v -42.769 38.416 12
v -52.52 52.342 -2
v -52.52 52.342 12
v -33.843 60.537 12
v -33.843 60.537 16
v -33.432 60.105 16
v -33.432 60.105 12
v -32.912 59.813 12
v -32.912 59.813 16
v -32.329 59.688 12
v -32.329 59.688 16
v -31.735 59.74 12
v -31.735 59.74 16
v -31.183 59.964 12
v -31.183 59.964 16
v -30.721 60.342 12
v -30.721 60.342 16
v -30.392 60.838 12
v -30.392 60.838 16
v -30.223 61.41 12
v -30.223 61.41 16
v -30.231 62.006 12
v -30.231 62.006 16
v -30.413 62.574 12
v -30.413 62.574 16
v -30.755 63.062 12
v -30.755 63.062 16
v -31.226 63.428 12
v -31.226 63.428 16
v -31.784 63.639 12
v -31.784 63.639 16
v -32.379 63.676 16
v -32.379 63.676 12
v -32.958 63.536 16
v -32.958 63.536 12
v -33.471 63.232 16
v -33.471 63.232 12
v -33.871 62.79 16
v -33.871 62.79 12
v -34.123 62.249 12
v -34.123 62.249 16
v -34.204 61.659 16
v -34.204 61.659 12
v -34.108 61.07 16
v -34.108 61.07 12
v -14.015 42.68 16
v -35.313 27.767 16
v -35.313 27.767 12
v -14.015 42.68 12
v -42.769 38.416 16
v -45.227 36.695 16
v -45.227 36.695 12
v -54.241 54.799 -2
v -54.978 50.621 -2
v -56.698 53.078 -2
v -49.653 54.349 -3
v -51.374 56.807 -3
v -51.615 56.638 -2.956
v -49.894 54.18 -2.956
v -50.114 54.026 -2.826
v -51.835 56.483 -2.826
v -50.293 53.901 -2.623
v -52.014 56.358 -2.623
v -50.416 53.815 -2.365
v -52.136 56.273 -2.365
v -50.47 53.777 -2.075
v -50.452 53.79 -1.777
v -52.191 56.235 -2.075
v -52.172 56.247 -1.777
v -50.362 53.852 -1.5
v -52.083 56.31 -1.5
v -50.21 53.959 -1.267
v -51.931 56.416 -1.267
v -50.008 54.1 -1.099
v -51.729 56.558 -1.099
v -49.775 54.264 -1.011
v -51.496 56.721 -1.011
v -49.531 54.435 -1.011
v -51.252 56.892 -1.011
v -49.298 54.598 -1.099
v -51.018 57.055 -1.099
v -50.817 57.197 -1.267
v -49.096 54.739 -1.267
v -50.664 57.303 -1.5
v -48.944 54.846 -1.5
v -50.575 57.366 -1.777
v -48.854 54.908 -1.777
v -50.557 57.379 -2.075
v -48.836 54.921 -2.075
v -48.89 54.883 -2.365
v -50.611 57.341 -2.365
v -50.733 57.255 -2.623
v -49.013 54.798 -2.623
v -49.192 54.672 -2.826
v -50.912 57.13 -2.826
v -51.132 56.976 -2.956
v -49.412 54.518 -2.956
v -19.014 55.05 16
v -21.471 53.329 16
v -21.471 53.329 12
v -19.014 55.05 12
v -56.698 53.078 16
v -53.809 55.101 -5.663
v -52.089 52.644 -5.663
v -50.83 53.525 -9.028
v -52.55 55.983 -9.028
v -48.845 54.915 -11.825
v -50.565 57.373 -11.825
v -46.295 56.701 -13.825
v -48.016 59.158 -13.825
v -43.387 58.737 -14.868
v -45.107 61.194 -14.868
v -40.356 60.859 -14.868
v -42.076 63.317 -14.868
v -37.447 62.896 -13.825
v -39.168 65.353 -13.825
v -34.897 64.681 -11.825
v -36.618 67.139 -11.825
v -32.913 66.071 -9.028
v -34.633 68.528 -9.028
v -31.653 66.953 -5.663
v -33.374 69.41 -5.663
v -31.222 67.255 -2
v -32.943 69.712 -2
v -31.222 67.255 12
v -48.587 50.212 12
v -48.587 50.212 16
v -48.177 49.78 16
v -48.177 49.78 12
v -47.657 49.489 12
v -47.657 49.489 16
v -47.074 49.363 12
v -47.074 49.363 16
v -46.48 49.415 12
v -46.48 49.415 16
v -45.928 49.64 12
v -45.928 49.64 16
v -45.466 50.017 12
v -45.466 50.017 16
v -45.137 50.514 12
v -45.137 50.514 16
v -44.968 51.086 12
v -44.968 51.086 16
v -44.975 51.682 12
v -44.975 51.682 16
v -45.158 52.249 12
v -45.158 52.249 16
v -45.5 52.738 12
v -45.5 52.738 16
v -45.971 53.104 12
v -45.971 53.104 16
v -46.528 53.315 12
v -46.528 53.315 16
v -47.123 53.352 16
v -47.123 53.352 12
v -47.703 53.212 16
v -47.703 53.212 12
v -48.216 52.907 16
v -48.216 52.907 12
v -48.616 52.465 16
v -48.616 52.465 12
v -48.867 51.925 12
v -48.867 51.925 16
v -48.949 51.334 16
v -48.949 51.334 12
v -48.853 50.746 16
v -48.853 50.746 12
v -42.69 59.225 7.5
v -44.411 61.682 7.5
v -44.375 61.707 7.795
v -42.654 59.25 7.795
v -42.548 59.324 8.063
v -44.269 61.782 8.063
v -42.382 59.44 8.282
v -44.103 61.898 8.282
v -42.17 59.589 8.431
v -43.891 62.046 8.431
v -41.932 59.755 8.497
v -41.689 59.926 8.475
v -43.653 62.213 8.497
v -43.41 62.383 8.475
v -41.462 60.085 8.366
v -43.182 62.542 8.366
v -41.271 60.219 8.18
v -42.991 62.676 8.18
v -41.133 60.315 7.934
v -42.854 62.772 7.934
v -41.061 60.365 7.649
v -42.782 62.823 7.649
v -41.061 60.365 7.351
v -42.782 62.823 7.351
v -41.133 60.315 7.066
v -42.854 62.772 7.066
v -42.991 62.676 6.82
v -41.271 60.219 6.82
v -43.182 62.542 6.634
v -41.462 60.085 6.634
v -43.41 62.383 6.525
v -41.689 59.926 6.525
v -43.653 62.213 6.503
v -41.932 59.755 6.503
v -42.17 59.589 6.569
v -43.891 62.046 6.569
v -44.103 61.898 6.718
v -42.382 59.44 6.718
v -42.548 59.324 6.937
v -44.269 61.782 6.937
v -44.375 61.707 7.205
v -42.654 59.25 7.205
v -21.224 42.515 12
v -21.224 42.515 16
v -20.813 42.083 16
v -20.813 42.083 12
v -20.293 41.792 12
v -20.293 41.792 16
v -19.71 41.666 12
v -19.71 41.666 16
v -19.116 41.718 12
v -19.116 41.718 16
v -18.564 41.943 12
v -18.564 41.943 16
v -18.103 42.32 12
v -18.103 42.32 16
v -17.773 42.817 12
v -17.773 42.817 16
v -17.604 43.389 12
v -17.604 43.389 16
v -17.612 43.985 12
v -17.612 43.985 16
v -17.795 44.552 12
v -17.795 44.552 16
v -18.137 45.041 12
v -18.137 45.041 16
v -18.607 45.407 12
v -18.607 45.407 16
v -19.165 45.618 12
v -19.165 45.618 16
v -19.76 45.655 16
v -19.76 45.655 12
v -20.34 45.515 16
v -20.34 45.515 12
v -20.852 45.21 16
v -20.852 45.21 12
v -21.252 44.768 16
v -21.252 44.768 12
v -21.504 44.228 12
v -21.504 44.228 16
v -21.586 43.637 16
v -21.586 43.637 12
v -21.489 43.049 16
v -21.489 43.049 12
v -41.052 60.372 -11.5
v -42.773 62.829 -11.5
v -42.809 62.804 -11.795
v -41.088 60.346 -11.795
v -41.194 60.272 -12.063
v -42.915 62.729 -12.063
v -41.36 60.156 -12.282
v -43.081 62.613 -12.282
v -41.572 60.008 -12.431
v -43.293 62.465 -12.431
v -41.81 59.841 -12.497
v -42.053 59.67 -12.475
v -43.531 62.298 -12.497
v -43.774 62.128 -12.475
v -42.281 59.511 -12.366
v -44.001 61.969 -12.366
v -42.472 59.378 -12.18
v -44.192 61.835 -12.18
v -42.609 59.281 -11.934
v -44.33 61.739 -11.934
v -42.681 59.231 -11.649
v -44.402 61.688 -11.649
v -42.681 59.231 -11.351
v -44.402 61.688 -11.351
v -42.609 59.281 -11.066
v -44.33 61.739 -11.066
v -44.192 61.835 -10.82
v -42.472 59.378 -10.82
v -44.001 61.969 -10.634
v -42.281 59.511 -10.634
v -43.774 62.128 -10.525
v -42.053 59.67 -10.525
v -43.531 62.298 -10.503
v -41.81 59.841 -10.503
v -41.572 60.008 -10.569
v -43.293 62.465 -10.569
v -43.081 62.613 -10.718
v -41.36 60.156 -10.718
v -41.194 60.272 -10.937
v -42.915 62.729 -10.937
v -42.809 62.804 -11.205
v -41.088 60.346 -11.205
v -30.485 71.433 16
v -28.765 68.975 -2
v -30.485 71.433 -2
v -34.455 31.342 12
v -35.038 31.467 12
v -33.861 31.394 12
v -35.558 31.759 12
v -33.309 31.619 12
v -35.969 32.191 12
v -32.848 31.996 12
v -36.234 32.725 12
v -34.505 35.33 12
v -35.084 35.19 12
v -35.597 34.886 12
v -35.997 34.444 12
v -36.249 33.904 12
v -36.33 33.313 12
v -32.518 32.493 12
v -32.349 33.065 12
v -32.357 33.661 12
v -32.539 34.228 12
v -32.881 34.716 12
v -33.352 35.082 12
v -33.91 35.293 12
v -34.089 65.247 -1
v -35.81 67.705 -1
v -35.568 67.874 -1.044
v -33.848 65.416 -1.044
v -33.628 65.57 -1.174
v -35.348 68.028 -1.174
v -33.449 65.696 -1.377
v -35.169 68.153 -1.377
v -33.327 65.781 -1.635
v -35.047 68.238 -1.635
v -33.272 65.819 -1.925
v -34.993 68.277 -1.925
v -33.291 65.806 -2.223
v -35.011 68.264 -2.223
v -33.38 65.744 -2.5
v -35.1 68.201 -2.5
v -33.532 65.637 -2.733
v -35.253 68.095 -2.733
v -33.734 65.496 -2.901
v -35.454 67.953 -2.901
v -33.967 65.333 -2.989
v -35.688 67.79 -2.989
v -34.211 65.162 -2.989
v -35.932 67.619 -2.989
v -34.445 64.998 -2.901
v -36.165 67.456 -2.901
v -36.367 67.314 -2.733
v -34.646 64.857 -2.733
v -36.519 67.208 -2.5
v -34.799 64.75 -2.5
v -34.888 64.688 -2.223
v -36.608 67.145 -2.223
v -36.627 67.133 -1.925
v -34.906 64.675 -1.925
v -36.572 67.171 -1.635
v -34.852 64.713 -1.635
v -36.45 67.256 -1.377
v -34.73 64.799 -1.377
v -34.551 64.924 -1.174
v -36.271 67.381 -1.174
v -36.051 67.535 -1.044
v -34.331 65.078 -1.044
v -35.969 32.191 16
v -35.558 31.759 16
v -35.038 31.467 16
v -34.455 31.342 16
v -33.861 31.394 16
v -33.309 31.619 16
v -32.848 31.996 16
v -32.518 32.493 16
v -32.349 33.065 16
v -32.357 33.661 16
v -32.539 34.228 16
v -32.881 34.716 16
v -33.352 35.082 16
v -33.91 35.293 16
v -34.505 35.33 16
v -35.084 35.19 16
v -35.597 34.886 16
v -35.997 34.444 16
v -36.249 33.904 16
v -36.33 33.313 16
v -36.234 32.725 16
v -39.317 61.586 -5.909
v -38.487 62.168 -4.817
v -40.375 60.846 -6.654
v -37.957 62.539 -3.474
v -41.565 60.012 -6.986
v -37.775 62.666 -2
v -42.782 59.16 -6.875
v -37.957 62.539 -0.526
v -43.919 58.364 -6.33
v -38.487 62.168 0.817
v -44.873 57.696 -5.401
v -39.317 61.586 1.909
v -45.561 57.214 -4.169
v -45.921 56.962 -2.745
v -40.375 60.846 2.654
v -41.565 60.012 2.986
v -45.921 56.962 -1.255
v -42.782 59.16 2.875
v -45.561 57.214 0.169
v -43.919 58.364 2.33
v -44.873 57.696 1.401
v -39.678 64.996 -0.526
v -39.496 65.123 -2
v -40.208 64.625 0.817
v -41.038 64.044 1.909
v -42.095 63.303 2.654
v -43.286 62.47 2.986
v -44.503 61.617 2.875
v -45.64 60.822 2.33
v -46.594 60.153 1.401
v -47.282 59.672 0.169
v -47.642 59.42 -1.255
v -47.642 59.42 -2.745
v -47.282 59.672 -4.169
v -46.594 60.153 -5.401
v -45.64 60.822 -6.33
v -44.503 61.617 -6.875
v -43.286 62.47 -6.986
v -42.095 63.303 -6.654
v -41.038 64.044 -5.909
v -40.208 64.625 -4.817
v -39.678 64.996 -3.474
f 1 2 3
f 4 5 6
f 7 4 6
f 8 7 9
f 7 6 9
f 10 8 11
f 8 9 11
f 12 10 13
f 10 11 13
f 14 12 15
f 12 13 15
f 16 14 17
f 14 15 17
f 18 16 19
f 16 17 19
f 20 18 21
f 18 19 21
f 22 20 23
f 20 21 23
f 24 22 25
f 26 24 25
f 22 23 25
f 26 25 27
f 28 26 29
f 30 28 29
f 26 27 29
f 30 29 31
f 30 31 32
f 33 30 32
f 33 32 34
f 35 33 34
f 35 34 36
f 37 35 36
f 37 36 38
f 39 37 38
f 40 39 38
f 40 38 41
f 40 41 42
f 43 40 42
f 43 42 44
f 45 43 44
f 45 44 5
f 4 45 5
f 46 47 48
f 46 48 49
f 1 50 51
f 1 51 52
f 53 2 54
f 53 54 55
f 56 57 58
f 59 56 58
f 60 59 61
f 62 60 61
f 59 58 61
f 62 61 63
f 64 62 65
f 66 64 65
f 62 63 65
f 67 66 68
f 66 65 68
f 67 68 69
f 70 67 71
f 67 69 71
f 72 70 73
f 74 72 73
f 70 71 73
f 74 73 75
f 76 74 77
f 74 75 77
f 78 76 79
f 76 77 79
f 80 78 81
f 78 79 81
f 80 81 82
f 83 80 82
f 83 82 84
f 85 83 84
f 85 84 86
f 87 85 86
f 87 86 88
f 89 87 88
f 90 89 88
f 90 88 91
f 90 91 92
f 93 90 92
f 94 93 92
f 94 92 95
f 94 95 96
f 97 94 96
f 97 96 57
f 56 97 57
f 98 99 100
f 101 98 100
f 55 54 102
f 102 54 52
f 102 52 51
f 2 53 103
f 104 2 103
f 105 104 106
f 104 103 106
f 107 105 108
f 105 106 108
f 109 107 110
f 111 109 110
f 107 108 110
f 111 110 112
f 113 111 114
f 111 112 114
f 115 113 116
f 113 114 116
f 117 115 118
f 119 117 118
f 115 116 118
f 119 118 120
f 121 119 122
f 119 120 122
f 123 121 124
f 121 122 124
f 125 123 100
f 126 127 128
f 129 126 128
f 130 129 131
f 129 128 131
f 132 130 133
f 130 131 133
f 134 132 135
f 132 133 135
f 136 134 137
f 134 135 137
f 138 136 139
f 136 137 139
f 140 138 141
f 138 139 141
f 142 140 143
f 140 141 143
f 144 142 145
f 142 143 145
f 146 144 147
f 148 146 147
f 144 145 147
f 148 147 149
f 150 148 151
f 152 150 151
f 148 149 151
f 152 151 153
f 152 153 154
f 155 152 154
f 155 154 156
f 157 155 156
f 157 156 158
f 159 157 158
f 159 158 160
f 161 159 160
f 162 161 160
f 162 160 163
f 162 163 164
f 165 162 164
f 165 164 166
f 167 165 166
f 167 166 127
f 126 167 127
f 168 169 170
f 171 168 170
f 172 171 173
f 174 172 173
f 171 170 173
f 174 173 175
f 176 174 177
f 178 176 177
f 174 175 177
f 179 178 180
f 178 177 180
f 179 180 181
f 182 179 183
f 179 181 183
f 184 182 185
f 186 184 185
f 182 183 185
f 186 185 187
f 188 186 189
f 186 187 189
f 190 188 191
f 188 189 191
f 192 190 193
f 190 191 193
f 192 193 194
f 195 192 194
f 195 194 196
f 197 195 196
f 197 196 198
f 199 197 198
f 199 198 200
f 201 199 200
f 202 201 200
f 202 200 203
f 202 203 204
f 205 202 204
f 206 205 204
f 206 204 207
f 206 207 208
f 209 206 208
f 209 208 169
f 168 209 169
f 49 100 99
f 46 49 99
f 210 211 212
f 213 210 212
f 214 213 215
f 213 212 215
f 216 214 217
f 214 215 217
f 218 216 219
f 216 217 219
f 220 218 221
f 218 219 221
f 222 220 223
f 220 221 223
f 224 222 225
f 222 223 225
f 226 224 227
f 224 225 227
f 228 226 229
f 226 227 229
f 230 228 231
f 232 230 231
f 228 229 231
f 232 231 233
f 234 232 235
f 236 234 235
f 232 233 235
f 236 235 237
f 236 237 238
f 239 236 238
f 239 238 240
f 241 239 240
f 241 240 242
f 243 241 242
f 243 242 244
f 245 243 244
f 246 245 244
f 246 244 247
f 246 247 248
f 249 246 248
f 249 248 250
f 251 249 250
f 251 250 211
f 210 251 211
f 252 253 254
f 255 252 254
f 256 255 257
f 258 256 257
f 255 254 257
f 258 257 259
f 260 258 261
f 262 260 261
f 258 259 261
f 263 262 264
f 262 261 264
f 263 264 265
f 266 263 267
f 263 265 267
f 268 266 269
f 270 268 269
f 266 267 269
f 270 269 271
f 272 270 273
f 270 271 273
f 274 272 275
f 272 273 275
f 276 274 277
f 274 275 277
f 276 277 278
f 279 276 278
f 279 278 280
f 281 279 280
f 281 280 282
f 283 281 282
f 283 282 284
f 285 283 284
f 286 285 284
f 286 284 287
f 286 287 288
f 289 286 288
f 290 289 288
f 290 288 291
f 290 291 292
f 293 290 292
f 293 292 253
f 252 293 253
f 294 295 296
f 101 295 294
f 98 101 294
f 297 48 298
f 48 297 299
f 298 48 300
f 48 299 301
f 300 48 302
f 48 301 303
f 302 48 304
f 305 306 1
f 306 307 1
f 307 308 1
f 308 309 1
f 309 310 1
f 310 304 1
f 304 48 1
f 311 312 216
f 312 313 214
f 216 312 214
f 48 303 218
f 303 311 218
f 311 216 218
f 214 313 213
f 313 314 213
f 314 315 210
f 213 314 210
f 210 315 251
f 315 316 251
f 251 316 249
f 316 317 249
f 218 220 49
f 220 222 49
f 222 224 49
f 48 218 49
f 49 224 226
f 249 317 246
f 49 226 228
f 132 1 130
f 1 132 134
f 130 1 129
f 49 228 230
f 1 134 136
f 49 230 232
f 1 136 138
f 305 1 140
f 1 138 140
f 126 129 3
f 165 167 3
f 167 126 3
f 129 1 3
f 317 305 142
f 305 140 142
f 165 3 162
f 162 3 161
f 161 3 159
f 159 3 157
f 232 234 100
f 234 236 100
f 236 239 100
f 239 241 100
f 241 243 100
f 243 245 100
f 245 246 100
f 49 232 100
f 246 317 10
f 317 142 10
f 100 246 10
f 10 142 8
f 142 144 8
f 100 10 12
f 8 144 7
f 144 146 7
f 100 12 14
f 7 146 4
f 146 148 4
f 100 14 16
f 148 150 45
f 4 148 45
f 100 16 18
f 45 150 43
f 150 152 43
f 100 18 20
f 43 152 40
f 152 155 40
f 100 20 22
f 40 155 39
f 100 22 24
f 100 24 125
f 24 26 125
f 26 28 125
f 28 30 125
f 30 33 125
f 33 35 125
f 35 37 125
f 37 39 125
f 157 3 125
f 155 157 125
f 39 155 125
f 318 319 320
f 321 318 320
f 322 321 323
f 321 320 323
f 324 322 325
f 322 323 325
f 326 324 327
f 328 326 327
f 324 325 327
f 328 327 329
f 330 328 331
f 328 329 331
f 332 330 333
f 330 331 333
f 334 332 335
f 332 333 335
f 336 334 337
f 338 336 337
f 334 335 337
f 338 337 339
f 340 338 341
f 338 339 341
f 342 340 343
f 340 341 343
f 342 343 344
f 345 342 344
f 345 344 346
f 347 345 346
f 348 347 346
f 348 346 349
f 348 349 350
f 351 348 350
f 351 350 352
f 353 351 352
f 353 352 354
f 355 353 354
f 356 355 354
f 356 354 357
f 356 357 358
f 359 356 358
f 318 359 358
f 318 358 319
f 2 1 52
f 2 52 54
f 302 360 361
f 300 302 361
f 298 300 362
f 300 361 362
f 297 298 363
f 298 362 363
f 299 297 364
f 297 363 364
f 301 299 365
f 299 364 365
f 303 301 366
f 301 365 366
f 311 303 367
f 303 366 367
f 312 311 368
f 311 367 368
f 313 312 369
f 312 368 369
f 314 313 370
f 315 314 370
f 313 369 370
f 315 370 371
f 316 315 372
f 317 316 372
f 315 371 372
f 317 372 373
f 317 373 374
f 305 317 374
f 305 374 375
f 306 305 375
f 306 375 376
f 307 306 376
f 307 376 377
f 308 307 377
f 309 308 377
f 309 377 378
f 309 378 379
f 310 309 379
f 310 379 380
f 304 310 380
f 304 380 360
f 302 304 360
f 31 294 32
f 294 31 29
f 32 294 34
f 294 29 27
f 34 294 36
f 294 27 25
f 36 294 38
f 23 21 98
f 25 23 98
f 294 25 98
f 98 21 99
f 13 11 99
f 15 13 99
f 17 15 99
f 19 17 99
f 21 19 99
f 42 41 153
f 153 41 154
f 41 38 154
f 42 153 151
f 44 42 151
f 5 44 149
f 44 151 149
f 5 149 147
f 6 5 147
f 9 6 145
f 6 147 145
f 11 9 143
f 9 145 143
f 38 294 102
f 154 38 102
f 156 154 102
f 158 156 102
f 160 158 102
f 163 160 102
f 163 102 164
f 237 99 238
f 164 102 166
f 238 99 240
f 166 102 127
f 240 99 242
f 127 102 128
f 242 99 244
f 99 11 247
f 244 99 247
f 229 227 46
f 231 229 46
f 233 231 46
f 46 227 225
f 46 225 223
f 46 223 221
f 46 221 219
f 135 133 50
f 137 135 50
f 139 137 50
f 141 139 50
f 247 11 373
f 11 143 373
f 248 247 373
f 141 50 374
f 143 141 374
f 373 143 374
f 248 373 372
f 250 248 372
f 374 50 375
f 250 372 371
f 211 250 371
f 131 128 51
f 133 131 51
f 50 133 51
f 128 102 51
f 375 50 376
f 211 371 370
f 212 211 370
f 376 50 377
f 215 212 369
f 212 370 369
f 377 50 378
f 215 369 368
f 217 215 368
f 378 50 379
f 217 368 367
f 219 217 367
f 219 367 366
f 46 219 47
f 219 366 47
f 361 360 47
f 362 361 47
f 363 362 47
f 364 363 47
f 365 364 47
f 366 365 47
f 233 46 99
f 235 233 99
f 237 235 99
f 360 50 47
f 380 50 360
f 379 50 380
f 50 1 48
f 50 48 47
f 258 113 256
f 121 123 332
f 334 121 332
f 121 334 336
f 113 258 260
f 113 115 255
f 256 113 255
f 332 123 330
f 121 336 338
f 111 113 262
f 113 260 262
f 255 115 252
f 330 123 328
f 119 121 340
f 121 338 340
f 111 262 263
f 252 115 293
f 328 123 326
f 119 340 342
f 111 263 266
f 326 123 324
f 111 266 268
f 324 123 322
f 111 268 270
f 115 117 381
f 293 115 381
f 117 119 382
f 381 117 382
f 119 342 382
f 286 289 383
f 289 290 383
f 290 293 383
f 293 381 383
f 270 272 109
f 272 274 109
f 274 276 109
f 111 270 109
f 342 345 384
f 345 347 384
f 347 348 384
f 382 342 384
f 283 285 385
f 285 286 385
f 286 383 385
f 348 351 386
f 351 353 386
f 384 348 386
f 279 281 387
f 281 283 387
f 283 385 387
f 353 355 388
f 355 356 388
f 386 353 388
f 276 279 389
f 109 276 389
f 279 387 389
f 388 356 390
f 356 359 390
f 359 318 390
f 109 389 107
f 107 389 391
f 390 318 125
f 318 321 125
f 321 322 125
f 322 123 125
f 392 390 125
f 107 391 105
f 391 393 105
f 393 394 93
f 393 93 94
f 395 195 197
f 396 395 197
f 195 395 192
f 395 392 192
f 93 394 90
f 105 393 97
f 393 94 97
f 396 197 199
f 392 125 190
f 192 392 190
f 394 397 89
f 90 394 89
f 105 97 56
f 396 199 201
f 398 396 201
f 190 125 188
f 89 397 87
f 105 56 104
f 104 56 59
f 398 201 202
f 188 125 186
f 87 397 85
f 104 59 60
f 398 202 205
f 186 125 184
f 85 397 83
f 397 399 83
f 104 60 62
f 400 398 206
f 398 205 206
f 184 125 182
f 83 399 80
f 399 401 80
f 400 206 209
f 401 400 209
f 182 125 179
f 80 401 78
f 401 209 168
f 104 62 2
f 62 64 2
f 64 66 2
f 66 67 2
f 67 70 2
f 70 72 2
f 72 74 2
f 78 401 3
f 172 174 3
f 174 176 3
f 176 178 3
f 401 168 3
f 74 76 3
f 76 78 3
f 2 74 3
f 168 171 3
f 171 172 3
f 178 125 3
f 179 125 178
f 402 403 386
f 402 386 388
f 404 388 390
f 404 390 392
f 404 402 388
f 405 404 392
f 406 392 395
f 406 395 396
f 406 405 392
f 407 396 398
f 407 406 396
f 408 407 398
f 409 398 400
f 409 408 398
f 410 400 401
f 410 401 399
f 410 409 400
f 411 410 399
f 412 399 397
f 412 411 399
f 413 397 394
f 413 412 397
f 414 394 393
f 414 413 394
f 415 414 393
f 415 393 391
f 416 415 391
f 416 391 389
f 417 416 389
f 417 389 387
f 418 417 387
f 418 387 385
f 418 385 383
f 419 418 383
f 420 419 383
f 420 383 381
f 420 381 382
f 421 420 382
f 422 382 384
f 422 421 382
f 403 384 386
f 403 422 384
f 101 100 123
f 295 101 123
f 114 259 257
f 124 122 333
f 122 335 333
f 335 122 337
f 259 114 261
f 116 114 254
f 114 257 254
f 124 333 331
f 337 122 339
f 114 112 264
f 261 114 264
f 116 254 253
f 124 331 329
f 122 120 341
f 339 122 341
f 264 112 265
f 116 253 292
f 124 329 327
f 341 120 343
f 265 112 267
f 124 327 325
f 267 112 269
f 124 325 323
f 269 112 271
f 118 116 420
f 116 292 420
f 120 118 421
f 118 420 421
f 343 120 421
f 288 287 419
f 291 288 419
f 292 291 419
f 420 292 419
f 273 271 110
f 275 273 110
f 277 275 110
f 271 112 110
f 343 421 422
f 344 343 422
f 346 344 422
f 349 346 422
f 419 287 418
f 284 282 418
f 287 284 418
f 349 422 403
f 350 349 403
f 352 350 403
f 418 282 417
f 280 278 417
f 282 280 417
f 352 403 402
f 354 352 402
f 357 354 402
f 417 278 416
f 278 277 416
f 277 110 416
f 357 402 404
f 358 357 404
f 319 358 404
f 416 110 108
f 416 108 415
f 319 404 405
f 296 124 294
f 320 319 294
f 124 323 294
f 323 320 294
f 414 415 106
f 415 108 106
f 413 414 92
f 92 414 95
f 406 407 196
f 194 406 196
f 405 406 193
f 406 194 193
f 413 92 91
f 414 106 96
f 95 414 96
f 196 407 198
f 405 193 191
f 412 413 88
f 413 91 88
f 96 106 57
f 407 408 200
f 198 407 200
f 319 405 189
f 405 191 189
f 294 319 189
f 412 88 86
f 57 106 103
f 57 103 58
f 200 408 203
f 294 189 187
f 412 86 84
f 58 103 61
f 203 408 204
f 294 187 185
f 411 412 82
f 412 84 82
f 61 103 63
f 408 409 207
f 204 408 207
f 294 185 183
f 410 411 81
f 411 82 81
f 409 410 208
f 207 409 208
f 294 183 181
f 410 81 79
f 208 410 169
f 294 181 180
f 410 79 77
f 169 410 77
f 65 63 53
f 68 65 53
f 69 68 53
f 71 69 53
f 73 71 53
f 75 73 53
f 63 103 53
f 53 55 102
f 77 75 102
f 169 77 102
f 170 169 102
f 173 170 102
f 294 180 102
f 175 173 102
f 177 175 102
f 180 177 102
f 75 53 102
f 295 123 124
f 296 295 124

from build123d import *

# Parameters (mm, degrees)
SKETCH084_R             = 5
PAD062_DEPTH            = 3
SKETCH085_W             = 26
SKETCH085_H             = 4
PAD063_DEPTH            = 30
SKETCH086_R             = 2
POCKET029_DEPTH         = 31.001
SKETCH087_R             = 1
POCKET030_DEPTH         = 137.42322
POLARPATTERN012_COUNT   = 4
PAD104_DEPTH            = 3
PAD105_DEPTH            = 3
BODY038_PLACEMENT_ANGLE = 35


with BuildPart() as part:
    # Sketch084 → Pad062 (new body)
    with BuildSketch(Plane.XZ):
        with BuildLine():
            Line((-13, 18), (13, 18))
            Line((13, 18), (13, 0))
            ThreePointArc((-13, 0), (0, -13), (13, 0))
            Line((-13, 18), (-13, 0))
        make_face()
        Circle(SKETCH084_R, mode=Mode.SUBTRACT)
    extrude(amount=PAD062_DEPTH)

    # Sketch085 (on Face7 of Pad062) → Pad063 (join)
    with BuildSketch(Plane.XZ.offset(3)):
        with Locations((0, 16)):
            Rectangle(SKETCH085_W, SKETCH085_H)
    extrude(amount=PAD063_DEPTH)

    # Sketch086 (on Face5 of Pad063) → Pocket029 (cut, through all)
    with BuildSketch(Plane(origin=(0, 0, 18), x_dir=(-1, 0, 0), z_dir=(0, 0, 1))):
        with Locations((-9, 7)):
            Circle(SKETCH086_R)
        with Locations((9, 7)):
            Circle(SKETCH086_R)
        with Locations((-9, 29)):
            Circle(SKETCH086_R)
        with Locations((9, 29)):
            Circle(SKETCH086_R)
    extrude(amount=-POCKET029_DEPTH, mode=Mode.SUBTRACT)

    # Sketch087 (on Face4 of Pocket029) → Pocket030 (cut, through all)
    with BuildSketch(Plane(origin=(0, 0, 0), x_dir=(1, 0, 0), z_dir=(0, 1, 0))):
        with Locations((0, 9.5)):
            Circle(SKETCH087_R)
    pocket030 = extrude(amount=-POCKET030_DEPTH, mode=Mode.SUBTRACT)

    # PolarPattern012: Pocket030 ×4 about axis
    polarpattern012_axis = Axis((0, 0, 0), (0, 1, 0))
    for i in range(1, POLARPATTERN012_COUNT):
        add(pocket030.rotate(polarpattern012_axis, i * 360 / POLARPATTERN012_COUNT), mode=Mode.SUBTRACT)

    # Sketch263 (on Face7 of PolarPattern012) → Pad104 (join)
    with BuildSketch(Plane(origin=(-13, 0, 0), x_dir=(0, 0, -1), z_dir=(-1, 0, 0))):
        Polygon((0, 0), (-18, 0), (-18, 20), (-14, 20), (0, 3), align=None)
    extrude(amount=PAD104_DEPTH)

    # Sketch264 (on Face10 of Pad104) → Pad105 (join)
    with BuildSketch(Plane(origin=(13, 0, 0), x_dir=(0, 0, 1), z_dir=(1, 0, 0))):
        Polygon((0, 0), (18, 0), (18, 20), (14, 20), (0, 3), align=None)
    extrude(amount=PAD105_DEPTH)


with BuildPart() as part_1:
    # Body038 placement: moved
    add(part.part.moved(Location((-43.591809, 62.255555, -2))).rotate(Axis((-43.591809, 62.255555, -2), (0, 0, 1)), BODY038_PLACEMENT_ANGLE))


solid = part_1.part
